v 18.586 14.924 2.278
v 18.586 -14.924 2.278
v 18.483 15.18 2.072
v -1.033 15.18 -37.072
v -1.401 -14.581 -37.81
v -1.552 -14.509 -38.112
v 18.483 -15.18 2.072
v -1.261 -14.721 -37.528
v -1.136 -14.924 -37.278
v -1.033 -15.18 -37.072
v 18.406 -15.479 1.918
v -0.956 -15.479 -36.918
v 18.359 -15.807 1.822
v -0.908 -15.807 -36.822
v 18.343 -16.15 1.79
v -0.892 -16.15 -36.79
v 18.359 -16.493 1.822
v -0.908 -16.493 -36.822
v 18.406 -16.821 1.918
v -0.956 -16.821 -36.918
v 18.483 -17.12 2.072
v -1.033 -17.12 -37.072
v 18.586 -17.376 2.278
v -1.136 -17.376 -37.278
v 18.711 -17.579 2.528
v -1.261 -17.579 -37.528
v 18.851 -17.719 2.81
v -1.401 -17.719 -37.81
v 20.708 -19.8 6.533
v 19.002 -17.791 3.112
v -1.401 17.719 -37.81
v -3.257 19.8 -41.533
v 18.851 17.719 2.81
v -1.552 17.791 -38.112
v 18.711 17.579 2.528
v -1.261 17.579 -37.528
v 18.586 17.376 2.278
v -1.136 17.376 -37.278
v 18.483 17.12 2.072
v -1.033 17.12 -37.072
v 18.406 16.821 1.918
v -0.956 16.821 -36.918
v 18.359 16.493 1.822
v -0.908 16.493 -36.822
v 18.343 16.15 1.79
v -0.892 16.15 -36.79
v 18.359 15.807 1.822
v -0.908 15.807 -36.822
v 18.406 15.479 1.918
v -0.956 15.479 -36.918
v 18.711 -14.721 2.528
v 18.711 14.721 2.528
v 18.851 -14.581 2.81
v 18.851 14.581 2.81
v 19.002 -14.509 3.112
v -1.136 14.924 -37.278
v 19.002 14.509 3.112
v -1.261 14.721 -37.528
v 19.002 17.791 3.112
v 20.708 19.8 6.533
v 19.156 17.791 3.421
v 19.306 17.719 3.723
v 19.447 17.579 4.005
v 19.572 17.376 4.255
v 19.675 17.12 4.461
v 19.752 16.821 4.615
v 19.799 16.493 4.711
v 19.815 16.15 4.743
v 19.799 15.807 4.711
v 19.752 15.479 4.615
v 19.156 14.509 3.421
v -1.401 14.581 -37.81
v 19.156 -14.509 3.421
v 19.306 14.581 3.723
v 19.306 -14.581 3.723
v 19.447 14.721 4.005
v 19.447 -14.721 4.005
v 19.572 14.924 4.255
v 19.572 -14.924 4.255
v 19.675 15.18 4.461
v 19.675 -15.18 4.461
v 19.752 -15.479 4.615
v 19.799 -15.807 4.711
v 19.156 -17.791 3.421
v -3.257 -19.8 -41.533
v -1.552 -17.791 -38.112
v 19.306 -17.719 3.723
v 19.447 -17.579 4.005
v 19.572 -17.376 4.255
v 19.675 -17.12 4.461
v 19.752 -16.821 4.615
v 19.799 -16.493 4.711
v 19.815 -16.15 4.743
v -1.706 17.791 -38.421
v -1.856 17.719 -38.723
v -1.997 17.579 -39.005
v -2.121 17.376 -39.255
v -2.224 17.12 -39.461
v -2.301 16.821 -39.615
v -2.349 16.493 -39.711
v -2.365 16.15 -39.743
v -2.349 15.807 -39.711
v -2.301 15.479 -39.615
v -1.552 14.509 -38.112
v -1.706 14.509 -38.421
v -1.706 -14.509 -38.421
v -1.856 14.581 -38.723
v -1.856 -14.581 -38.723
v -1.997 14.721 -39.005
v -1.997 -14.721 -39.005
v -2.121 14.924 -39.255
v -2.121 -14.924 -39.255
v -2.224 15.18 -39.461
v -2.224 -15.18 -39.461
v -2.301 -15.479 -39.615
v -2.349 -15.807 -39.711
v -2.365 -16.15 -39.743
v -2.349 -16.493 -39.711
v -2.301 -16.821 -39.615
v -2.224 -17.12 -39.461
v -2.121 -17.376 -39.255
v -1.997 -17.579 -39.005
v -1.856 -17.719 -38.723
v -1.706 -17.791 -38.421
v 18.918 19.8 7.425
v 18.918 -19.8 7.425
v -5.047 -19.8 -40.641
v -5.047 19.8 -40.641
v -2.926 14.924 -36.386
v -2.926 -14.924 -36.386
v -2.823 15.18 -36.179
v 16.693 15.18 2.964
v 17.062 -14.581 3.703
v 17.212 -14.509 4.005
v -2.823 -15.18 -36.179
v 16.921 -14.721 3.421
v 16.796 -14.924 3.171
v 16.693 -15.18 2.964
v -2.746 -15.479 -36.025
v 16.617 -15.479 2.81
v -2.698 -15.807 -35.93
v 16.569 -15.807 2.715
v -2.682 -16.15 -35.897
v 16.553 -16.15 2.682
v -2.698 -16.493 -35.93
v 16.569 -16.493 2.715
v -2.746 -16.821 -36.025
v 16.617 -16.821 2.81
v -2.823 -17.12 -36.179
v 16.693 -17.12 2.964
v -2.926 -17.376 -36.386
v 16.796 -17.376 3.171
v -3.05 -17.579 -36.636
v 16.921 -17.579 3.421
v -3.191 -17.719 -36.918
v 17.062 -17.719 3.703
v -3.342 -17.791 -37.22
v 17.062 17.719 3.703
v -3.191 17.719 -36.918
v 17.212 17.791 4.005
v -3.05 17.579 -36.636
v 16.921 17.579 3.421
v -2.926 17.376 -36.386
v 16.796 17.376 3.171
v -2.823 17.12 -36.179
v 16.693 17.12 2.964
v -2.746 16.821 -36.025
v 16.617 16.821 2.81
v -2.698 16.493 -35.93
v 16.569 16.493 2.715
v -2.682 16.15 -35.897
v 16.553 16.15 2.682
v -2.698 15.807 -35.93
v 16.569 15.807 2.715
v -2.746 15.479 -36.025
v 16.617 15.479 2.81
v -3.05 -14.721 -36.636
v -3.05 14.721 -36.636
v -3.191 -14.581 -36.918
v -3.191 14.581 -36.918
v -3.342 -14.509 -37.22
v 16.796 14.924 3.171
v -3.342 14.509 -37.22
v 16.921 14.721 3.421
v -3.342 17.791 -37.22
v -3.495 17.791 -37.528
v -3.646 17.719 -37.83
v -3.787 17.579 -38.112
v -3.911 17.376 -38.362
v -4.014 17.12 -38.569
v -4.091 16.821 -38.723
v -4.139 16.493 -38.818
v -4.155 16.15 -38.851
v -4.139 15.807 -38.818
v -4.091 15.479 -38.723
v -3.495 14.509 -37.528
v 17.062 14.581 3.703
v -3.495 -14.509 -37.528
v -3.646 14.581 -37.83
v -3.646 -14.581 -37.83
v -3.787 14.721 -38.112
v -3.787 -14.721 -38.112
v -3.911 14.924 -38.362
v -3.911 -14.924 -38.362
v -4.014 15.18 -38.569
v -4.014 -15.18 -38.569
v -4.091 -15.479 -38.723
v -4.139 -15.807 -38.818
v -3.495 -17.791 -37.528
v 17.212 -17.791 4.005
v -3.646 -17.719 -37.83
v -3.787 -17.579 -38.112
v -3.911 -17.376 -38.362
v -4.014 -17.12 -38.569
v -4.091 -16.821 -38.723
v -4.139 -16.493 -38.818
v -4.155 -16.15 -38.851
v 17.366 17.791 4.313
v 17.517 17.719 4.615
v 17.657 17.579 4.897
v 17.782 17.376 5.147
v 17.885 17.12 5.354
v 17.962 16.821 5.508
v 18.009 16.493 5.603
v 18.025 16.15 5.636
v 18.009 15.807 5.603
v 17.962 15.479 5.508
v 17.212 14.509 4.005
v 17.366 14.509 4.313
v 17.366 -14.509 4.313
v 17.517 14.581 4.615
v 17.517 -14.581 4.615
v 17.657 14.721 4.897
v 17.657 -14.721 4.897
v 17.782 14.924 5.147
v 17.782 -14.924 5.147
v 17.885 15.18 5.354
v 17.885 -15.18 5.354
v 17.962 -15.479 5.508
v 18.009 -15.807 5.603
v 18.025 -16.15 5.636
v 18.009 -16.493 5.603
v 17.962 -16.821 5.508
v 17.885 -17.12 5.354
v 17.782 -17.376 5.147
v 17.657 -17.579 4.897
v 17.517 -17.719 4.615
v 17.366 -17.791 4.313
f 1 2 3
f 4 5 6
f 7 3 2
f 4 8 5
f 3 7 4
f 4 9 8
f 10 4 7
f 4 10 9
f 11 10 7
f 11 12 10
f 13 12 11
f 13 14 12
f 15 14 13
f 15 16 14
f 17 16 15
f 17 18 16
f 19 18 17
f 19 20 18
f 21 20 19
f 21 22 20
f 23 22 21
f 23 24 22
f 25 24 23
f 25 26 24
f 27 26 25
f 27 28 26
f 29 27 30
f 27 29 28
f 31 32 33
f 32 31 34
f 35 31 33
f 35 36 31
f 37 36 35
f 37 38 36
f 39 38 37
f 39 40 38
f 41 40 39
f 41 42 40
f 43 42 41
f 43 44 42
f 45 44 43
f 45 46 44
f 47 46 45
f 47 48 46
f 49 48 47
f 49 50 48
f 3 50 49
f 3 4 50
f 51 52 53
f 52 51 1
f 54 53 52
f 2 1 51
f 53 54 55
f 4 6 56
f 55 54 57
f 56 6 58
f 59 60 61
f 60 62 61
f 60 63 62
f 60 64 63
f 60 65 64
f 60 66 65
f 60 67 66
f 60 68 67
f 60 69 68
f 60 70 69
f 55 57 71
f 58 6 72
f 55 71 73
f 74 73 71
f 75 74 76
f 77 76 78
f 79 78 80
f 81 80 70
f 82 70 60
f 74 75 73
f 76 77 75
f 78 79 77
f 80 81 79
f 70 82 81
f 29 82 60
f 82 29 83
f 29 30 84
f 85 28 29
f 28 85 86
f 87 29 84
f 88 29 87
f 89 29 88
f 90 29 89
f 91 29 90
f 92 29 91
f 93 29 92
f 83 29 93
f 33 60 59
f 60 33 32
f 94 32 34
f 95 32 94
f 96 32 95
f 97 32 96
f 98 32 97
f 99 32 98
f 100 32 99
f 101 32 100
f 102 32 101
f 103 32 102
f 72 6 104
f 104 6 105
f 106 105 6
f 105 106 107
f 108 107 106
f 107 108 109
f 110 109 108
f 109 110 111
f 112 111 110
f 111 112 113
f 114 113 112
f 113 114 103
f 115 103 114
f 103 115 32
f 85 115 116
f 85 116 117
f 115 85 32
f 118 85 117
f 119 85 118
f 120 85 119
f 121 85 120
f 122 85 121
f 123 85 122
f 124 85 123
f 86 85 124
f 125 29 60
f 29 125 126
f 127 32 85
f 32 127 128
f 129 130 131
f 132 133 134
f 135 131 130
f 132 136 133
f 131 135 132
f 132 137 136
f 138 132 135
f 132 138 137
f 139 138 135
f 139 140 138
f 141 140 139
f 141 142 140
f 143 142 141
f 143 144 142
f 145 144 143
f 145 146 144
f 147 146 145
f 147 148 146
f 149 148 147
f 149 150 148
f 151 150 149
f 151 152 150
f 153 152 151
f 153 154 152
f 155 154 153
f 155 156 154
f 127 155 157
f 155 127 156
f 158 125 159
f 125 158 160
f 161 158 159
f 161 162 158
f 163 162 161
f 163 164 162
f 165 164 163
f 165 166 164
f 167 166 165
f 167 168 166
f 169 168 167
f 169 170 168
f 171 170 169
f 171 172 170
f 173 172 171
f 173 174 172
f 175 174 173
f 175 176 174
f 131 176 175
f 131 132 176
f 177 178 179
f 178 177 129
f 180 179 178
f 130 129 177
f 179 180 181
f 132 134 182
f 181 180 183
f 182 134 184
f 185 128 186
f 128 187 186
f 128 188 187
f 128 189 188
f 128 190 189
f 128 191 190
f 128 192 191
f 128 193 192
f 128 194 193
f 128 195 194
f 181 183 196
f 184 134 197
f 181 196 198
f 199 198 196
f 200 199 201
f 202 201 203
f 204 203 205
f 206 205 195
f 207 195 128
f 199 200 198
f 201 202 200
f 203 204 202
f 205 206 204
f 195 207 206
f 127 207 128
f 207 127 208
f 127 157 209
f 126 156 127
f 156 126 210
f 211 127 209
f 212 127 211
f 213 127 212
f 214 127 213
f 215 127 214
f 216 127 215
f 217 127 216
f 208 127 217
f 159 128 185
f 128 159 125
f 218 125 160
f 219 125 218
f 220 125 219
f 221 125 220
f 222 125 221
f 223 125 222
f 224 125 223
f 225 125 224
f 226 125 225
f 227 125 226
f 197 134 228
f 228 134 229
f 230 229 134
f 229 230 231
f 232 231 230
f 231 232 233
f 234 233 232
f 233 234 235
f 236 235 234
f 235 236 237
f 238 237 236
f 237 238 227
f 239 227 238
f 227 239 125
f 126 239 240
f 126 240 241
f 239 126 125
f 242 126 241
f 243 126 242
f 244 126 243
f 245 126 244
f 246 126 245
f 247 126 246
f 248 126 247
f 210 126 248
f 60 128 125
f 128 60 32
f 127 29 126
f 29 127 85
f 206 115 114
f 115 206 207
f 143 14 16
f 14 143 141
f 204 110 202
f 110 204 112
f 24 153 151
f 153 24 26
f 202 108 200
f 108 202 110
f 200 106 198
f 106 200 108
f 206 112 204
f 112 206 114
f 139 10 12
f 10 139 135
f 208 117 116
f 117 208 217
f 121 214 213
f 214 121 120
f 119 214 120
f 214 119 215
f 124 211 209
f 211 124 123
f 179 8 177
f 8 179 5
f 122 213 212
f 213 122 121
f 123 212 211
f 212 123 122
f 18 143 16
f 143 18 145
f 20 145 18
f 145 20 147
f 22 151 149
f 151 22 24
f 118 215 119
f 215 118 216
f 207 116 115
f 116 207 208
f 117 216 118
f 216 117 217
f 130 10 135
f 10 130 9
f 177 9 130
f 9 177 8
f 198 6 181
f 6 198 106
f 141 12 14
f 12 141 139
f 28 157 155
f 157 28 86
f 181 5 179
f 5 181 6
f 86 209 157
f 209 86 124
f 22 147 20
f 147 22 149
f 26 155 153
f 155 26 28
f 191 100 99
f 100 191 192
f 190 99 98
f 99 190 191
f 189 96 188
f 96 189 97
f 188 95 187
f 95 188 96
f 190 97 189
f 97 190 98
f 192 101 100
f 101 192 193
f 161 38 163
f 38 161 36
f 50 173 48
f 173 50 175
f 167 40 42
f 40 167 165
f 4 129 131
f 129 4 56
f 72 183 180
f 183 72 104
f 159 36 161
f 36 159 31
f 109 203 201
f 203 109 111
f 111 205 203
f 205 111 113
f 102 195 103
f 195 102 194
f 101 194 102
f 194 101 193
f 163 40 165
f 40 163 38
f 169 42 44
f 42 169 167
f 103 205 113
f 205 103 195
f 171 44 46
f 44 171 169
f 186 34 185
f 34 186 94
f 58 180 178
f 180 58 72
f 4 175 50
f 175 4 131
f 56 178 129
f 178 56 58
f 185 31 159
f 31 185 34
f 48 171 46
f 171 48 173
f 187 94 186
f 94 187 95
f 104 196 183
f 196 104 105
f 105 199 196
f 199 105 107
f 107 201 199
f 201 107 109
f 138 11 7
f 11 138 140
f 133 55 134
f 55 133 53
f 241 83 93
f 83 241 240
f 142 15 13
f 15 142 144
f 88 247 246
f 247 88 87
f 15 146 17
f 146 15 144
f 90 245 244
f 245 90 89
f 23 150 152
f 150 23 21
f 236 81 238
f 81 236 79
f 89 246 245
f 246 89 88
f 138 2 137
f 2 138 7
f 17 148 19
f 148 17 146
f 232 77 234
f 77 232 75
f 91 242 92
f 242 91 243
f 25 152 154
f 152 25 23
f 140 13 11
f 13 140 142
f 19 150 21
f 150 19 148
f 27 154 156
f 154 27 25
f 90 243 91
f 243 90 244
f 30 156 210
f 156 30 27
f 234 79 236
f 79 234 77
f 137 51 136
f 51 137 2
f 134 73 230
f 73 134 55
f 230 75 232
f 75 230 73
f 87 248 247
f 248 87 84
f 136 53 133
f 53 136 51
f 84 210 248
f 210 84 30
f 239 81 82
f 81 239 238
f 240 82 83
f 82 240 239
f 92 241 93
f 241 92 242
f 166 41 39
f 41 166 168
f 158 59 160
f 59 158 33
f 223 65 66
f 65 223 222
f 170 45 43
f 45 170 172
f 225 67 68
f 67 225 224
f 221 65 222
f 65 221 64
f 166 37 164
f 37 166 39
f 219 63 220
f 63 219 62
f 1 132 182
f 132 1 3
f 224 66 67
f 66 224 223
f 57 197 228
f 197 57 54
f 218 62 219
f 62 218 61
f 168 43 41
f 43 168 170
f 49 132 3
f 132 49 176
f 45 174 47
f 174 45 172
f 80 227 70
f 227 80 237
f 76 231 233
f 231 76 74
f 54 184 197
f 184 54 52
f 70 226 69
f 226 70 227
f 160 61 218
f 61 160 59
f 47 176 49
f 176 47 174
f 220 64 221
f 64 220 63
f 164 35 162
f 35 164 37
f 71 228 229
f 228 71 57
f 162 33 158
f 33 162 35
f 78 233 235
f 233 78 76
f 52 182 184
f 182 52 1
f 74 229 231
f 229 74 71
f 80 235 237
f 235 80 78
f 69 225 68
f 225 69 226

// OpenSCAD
$fn = 30;

arm_length = 65;
arm_base_width = 25;
arm_base_height = 35;

arm_end_width = 9;
arm_end_height = 30;

ship_back_angle = 26.5;

axis_diameter = 3.4;
axis_offset = 3;
axis_length = 40;
axis_over = 5;

axis_cap_height = 8;
axis_cap_width = 6;

cotter_diameter = 1.6;

plate_thickness = 2;
plate_screw_diameter = 3.3;
plate_padding = 2;
plate_margin = 2;

rudder_height = 50;
rudder_width = 6;
rudder_length = 30;

rudder_end_width = 3;
rudder_end_length = 15;

servo_lever_width = 40;

// priestor medzi arm a rudder
ra_z = 0.5;
ra_x = 0.5;

// hrubka toho pliesku na bowdeny
x = 1.5;

e = 0.0001;

arm_scale_width = arm_end_width / arm_base_width;
arm_scale_height = arm_end_height / arm_base_height;
arm_base_rotated_height = arm_base_height/sin(90-ship_back_angle);

plate_width = 2*plate_screw_diameter + 2*plate_padding + 2*plate_margin + arm_base_width;
plate_height = 2*plate_screw_diameter + 2*plate_padding + 2*plate_margin + arm_base_rotated_height;

alpha = atan(rudder_length/(rudder_width/2));
axis_center_x = tan(alpha/2) * (rudder_width/2);

rudder_scale_width = rudder_end_width / rudder_width;
rudder_scale_length = rudder_end_length / rudder_length;

water_pipe_offset=17.5;

module arm() {
    difference() {
        rotate([0, 90, 0])
        linear_extrude(height=arm_length, scale=[arm_scale_height, arm_scale_width])
        translate([0, -arm_base_width/2, 0])
        square([arm_base_height, arm_base_width]);
        
        translate([0, 0, -arm_base_height])
        rotate([0, ship_back_angle, 0])
        translate([-arm_base_height, -arm_base_width/2, 0])
        cube([arm_base_height, arm_base_width, arm_base_height*2]);
        
        axis();
        
        rotate([0, 90, 0])
        translate([arm_end_height/4-ra_z, -arm_base_width/2, arm_length-arm_end_width/2-ra_x])
        cube([arm_end_height/2+2*ra_z, arm_base_width+2*ra_x, arm_base_width+2*ra_x]);
    }
    
    difference() {
        rotate([0, 180, 0])
        translate([-arm_length, 0, -arm_end_width/2])
        cylinder(h=arm_base_height, r=arm_end_width/2);
        
        rotate([0, 90, 0])
        translate([arm_end_height/4-ra_z, -arm_base_width/2, arm_length-arm_end_width/2])
        cube([arm_end_height/2+2*ra_z, arm_base_width, arm_base_width]);
        
        rotate([0, 0, 0])
        translate([arm_end_height/4-ra_z, -arm_base_width/2, arm_length-arm_end_width/2])
        cube([arm_end_height/2+2*ra_z, arm_base_width, arm_base_width]);
        
        rotate([0, 90, 0])
        translate([0, -arm_base_width/2, arm_length-arm_end_width/2])
        rotate([0, -90, 0])
        cube([arm_end_height/2+2*ra_z, arm_base_width, arm_base_width]);
        
        rotate([0, 90, 0])
        translate([arm_end_height, -arm_base_width/2, arm_length-arm_end_width/2])
        cube([arm_end_height/2+2*ra_z, arm_base_width, arm_base_width]);
        
        axis();
    }
    
    difference() {
        translate([arm_length, 0, 0])
        cylinder(h=axis_cap_height, r=axis_cap_width/2);
        
        axis();
        
        translate([arm_length-axis_cap_width, 0, e+axis_cap_height/2])
        rotate([0, 90, 0])
        cylinder(h=axis_cap_width*2+e, r=cotter_diameter/2);
    }
}

module rudder(){
    difference() {
        translate([arm_length, 0, -arm_end_height/4])
        rotate([0, 180, 0])
        cylinder(h=arm_end_height/2, r=arm_end_width/2);
        
        axis();
    }
    
    difference() {
        rotate([0, 90, 0])
        translate([arm_end_height/4, -(arm_end_width)/2, arm_length])
        cube([arm_end_height/2, arm_end_width, rudder_length]);
        
        translate([arm_length, 0, 0])
        rotate([0, 180, 0])
        cylinder(h=arm_end_height, r=arm_end_width/2);
    }
   
    rotate([0, 90, 0])
    translate([arm_end_height/2, -(arm_end_width)/2, arm_length+arm_end_width/2+ra_x])
    cube([arm_end_height/2, arm_end_width, rudder_length-arm_end_width/2-ra_x]);
    
    rotate([180, 0, 0])
    translate([arm_length+arm_end_width/2+ra_x, 0, arm_end_height])
    linear_extrude(height=rudder_height, scale=0.7)
    translate([0, -(arm_end_width)/2, 0])
    polygon(points=[[0, arm_end_width/2], [rudder_length-arm_end_width/2-ra_x, arm_end_width-1], [rudder_length-arm_end_width/2-ra_x, 1]]);
    
    //color("red")
    rotate([0, 90, 0])
    translate([arm_end_height/4, -(arm_end_width)/2, arm_length+arm_end_width/2+ra_x]) {
        cube([x, arm_end_width, rudder_length-arm_end_width/2-ra_x]);
        
        difference(){
            hull() {
            //ten velky, stredna translate hodnota sa ma menit
            color("red")
            rotate([0, 90, 0])
            translate([-arm_end_width/2, -(servo_lever_width/2-arm_end_width/2), 0])
            cylinder(h=x, r=arm_end_width/2);
            
            color("red")
            translate([0, -e, 0])
            cube([x, e, e]);
            
            color("red")
            rotate([0, 90, 0])
            translate([-(rudder_length-arm_end_width/2-ra_x), 0, 0])
            cylinder(h=x, r=e);
            }
            
            for(i=[servo_lever_width/2-arm_end_width/2 : -5 : 5]) {
                color("red")
                rotate([0, 90, 0])
                translate([-arm_end_width/2, -i, -x/2])
                cylinder(h=x*2, d=1.8);
            }
        }
        
        difference() {
            hull() {
            color("red")
            rotate([0, 90, 0])
            translate([-arm_end_width/2, (servo_lever_width/2+arm_end_width/2), 0])
            cylinder(h=x, r=arm_end_width/2);
            
            color("red")
            translate([0, e, 0])
            cube([x, e, e]);
            
            color("red")
            rotate([0, 90, 0])
            translate([-(rudder_length-arm_end_width/2-ra_x), arm_end_width, 0])
            cylinder(h=x, r=e);
            }
            
            for(i=[servo_lever_width/2-arm_end_width/2+arm_end_width : -5 : 12]) {
                color("red")
                rotate([0, 90, 0])
                translate([-arm_end_width/2, i, -x/2])
                cylinder(h=x*2, d=1.8);
            }
        }
        
        difference() {
            union() {

                pipe_d = 5;

                color("red")
                translate([-10, arm_end_width/2, water_pipe_offset])
                rotate([0, 90, 0])
                cylinder(h=10, d=5);
                
                color("red")
                translate([70-arm_end_height/4, arm_end_width/2, 0])
                cylinder(h=water_pipe_offset-arm_end_width, d=pipe_d);
                
                color("red")
                translate([0, arm_end_width/2, water_pipe_offset])
                rotate([0, 90, 0])
                cylinder(h=70-arm_end_height/4-arm_end_width, d=pipe_d);
                
                color("blue")
                translate([70-arm_end_height/4-arm_end_width, arm_end_width/2, water_pipe_offset-arm_end_width])
                rotate([90, 0, 0])
                rotate_extrude(angle=90)
                translate([arm_end_width, 0, 0])
                circle(d=pipe_d);
            }
            
            
        }
    }
       
}

module plate() {
    translate([0, 0, -arm_base_height])
    rotate([0, ship_back_angle, 0])
    translate([-plate_thickness, -plate_width/2, -plate_padding-plate_screw_diameter-plate_margin]) {
        difference() {
            cube([plate_thickness, plate_width, plate_height]);
            
            rotate([0, 90, 0])
            translate([-plate_margin-plate_screw_diameter/2, plate_margin+plate_screw_diameter/2, -plate_thickness/2])
            cylinder(h=plate_thickness*2, r=plate_screw_diameter/2);
            
            rotate([0, 90, 0])
            translate([-plate_margin-plate_screw_diameter/2, plate_padding+plate_margin*2+plate_screw_diameter*1.5+arm_base_width, -plate_thickness/2])
            cylinder(h=plate_thickness*2, r=plate_screw_diameter/2);
            
            offsetX = arm_base_rotated_height + plate_margin + 1.5*plate_screw_diameter + 2*plate_padding;
            
            rotate([0, 90, 0])
            translate([-offsetX, plate_margin+plate_screw_diameter/2, -plate_thickness/2])
            cylinder(h=plate_thickness*2, r=plate_screw_diameter/2);
            
            rotate([0, 90, 0])
            translate([-offsetX, plate_padding+plate_margin*2+plate_screw_diameter*1.5+arm_base_width, -plate_thickness/2])
            cylinder(h=plate_thickness*2, r=plate_screw_diameter/2);
        }
    }
}

module axis() {
    translate([arm_length, 0, axis_length])
    rotate([180, 0, 0])
    cylinder(h=axis_length*2, r=axis_diameter/2);
}

//axis();

/*
difference()
{
    rudder();
    rotate([0, 90, 0])
    translate([arm_end_height/4, -(arm_end_width)/2, arm_length+arm_end_width/2+ra_x])
    union() {
        pipe_d = 3.5;
        color("red")
        translate([70-arm_end_height/4, arm_end_width/2, -10*e+0])
        cylinder(h=100*e+water_pipe_offset-arm_end_width, d=pipe_d);
        
        color("red")
        translate([-15, arm_end_width/2, water_pipe_offset])
        rotate([0, 90, 0])
        cylinder(h=85+10*e-arm_end_height/4-arm_end_width, d=pipe_d);
        
        color("blue")
        translate([70-arm_end_height/4-arm_end_width, arm_end_width/2, water_pipe_offset-arm_end_width])
        rotate([90, 0, 0])
        rotate_extrude(angle=90)
        translate([arm_end_width, 0, 0])
        circle(d=pipe_d);
    }
}
*/

//arm();
plate();
